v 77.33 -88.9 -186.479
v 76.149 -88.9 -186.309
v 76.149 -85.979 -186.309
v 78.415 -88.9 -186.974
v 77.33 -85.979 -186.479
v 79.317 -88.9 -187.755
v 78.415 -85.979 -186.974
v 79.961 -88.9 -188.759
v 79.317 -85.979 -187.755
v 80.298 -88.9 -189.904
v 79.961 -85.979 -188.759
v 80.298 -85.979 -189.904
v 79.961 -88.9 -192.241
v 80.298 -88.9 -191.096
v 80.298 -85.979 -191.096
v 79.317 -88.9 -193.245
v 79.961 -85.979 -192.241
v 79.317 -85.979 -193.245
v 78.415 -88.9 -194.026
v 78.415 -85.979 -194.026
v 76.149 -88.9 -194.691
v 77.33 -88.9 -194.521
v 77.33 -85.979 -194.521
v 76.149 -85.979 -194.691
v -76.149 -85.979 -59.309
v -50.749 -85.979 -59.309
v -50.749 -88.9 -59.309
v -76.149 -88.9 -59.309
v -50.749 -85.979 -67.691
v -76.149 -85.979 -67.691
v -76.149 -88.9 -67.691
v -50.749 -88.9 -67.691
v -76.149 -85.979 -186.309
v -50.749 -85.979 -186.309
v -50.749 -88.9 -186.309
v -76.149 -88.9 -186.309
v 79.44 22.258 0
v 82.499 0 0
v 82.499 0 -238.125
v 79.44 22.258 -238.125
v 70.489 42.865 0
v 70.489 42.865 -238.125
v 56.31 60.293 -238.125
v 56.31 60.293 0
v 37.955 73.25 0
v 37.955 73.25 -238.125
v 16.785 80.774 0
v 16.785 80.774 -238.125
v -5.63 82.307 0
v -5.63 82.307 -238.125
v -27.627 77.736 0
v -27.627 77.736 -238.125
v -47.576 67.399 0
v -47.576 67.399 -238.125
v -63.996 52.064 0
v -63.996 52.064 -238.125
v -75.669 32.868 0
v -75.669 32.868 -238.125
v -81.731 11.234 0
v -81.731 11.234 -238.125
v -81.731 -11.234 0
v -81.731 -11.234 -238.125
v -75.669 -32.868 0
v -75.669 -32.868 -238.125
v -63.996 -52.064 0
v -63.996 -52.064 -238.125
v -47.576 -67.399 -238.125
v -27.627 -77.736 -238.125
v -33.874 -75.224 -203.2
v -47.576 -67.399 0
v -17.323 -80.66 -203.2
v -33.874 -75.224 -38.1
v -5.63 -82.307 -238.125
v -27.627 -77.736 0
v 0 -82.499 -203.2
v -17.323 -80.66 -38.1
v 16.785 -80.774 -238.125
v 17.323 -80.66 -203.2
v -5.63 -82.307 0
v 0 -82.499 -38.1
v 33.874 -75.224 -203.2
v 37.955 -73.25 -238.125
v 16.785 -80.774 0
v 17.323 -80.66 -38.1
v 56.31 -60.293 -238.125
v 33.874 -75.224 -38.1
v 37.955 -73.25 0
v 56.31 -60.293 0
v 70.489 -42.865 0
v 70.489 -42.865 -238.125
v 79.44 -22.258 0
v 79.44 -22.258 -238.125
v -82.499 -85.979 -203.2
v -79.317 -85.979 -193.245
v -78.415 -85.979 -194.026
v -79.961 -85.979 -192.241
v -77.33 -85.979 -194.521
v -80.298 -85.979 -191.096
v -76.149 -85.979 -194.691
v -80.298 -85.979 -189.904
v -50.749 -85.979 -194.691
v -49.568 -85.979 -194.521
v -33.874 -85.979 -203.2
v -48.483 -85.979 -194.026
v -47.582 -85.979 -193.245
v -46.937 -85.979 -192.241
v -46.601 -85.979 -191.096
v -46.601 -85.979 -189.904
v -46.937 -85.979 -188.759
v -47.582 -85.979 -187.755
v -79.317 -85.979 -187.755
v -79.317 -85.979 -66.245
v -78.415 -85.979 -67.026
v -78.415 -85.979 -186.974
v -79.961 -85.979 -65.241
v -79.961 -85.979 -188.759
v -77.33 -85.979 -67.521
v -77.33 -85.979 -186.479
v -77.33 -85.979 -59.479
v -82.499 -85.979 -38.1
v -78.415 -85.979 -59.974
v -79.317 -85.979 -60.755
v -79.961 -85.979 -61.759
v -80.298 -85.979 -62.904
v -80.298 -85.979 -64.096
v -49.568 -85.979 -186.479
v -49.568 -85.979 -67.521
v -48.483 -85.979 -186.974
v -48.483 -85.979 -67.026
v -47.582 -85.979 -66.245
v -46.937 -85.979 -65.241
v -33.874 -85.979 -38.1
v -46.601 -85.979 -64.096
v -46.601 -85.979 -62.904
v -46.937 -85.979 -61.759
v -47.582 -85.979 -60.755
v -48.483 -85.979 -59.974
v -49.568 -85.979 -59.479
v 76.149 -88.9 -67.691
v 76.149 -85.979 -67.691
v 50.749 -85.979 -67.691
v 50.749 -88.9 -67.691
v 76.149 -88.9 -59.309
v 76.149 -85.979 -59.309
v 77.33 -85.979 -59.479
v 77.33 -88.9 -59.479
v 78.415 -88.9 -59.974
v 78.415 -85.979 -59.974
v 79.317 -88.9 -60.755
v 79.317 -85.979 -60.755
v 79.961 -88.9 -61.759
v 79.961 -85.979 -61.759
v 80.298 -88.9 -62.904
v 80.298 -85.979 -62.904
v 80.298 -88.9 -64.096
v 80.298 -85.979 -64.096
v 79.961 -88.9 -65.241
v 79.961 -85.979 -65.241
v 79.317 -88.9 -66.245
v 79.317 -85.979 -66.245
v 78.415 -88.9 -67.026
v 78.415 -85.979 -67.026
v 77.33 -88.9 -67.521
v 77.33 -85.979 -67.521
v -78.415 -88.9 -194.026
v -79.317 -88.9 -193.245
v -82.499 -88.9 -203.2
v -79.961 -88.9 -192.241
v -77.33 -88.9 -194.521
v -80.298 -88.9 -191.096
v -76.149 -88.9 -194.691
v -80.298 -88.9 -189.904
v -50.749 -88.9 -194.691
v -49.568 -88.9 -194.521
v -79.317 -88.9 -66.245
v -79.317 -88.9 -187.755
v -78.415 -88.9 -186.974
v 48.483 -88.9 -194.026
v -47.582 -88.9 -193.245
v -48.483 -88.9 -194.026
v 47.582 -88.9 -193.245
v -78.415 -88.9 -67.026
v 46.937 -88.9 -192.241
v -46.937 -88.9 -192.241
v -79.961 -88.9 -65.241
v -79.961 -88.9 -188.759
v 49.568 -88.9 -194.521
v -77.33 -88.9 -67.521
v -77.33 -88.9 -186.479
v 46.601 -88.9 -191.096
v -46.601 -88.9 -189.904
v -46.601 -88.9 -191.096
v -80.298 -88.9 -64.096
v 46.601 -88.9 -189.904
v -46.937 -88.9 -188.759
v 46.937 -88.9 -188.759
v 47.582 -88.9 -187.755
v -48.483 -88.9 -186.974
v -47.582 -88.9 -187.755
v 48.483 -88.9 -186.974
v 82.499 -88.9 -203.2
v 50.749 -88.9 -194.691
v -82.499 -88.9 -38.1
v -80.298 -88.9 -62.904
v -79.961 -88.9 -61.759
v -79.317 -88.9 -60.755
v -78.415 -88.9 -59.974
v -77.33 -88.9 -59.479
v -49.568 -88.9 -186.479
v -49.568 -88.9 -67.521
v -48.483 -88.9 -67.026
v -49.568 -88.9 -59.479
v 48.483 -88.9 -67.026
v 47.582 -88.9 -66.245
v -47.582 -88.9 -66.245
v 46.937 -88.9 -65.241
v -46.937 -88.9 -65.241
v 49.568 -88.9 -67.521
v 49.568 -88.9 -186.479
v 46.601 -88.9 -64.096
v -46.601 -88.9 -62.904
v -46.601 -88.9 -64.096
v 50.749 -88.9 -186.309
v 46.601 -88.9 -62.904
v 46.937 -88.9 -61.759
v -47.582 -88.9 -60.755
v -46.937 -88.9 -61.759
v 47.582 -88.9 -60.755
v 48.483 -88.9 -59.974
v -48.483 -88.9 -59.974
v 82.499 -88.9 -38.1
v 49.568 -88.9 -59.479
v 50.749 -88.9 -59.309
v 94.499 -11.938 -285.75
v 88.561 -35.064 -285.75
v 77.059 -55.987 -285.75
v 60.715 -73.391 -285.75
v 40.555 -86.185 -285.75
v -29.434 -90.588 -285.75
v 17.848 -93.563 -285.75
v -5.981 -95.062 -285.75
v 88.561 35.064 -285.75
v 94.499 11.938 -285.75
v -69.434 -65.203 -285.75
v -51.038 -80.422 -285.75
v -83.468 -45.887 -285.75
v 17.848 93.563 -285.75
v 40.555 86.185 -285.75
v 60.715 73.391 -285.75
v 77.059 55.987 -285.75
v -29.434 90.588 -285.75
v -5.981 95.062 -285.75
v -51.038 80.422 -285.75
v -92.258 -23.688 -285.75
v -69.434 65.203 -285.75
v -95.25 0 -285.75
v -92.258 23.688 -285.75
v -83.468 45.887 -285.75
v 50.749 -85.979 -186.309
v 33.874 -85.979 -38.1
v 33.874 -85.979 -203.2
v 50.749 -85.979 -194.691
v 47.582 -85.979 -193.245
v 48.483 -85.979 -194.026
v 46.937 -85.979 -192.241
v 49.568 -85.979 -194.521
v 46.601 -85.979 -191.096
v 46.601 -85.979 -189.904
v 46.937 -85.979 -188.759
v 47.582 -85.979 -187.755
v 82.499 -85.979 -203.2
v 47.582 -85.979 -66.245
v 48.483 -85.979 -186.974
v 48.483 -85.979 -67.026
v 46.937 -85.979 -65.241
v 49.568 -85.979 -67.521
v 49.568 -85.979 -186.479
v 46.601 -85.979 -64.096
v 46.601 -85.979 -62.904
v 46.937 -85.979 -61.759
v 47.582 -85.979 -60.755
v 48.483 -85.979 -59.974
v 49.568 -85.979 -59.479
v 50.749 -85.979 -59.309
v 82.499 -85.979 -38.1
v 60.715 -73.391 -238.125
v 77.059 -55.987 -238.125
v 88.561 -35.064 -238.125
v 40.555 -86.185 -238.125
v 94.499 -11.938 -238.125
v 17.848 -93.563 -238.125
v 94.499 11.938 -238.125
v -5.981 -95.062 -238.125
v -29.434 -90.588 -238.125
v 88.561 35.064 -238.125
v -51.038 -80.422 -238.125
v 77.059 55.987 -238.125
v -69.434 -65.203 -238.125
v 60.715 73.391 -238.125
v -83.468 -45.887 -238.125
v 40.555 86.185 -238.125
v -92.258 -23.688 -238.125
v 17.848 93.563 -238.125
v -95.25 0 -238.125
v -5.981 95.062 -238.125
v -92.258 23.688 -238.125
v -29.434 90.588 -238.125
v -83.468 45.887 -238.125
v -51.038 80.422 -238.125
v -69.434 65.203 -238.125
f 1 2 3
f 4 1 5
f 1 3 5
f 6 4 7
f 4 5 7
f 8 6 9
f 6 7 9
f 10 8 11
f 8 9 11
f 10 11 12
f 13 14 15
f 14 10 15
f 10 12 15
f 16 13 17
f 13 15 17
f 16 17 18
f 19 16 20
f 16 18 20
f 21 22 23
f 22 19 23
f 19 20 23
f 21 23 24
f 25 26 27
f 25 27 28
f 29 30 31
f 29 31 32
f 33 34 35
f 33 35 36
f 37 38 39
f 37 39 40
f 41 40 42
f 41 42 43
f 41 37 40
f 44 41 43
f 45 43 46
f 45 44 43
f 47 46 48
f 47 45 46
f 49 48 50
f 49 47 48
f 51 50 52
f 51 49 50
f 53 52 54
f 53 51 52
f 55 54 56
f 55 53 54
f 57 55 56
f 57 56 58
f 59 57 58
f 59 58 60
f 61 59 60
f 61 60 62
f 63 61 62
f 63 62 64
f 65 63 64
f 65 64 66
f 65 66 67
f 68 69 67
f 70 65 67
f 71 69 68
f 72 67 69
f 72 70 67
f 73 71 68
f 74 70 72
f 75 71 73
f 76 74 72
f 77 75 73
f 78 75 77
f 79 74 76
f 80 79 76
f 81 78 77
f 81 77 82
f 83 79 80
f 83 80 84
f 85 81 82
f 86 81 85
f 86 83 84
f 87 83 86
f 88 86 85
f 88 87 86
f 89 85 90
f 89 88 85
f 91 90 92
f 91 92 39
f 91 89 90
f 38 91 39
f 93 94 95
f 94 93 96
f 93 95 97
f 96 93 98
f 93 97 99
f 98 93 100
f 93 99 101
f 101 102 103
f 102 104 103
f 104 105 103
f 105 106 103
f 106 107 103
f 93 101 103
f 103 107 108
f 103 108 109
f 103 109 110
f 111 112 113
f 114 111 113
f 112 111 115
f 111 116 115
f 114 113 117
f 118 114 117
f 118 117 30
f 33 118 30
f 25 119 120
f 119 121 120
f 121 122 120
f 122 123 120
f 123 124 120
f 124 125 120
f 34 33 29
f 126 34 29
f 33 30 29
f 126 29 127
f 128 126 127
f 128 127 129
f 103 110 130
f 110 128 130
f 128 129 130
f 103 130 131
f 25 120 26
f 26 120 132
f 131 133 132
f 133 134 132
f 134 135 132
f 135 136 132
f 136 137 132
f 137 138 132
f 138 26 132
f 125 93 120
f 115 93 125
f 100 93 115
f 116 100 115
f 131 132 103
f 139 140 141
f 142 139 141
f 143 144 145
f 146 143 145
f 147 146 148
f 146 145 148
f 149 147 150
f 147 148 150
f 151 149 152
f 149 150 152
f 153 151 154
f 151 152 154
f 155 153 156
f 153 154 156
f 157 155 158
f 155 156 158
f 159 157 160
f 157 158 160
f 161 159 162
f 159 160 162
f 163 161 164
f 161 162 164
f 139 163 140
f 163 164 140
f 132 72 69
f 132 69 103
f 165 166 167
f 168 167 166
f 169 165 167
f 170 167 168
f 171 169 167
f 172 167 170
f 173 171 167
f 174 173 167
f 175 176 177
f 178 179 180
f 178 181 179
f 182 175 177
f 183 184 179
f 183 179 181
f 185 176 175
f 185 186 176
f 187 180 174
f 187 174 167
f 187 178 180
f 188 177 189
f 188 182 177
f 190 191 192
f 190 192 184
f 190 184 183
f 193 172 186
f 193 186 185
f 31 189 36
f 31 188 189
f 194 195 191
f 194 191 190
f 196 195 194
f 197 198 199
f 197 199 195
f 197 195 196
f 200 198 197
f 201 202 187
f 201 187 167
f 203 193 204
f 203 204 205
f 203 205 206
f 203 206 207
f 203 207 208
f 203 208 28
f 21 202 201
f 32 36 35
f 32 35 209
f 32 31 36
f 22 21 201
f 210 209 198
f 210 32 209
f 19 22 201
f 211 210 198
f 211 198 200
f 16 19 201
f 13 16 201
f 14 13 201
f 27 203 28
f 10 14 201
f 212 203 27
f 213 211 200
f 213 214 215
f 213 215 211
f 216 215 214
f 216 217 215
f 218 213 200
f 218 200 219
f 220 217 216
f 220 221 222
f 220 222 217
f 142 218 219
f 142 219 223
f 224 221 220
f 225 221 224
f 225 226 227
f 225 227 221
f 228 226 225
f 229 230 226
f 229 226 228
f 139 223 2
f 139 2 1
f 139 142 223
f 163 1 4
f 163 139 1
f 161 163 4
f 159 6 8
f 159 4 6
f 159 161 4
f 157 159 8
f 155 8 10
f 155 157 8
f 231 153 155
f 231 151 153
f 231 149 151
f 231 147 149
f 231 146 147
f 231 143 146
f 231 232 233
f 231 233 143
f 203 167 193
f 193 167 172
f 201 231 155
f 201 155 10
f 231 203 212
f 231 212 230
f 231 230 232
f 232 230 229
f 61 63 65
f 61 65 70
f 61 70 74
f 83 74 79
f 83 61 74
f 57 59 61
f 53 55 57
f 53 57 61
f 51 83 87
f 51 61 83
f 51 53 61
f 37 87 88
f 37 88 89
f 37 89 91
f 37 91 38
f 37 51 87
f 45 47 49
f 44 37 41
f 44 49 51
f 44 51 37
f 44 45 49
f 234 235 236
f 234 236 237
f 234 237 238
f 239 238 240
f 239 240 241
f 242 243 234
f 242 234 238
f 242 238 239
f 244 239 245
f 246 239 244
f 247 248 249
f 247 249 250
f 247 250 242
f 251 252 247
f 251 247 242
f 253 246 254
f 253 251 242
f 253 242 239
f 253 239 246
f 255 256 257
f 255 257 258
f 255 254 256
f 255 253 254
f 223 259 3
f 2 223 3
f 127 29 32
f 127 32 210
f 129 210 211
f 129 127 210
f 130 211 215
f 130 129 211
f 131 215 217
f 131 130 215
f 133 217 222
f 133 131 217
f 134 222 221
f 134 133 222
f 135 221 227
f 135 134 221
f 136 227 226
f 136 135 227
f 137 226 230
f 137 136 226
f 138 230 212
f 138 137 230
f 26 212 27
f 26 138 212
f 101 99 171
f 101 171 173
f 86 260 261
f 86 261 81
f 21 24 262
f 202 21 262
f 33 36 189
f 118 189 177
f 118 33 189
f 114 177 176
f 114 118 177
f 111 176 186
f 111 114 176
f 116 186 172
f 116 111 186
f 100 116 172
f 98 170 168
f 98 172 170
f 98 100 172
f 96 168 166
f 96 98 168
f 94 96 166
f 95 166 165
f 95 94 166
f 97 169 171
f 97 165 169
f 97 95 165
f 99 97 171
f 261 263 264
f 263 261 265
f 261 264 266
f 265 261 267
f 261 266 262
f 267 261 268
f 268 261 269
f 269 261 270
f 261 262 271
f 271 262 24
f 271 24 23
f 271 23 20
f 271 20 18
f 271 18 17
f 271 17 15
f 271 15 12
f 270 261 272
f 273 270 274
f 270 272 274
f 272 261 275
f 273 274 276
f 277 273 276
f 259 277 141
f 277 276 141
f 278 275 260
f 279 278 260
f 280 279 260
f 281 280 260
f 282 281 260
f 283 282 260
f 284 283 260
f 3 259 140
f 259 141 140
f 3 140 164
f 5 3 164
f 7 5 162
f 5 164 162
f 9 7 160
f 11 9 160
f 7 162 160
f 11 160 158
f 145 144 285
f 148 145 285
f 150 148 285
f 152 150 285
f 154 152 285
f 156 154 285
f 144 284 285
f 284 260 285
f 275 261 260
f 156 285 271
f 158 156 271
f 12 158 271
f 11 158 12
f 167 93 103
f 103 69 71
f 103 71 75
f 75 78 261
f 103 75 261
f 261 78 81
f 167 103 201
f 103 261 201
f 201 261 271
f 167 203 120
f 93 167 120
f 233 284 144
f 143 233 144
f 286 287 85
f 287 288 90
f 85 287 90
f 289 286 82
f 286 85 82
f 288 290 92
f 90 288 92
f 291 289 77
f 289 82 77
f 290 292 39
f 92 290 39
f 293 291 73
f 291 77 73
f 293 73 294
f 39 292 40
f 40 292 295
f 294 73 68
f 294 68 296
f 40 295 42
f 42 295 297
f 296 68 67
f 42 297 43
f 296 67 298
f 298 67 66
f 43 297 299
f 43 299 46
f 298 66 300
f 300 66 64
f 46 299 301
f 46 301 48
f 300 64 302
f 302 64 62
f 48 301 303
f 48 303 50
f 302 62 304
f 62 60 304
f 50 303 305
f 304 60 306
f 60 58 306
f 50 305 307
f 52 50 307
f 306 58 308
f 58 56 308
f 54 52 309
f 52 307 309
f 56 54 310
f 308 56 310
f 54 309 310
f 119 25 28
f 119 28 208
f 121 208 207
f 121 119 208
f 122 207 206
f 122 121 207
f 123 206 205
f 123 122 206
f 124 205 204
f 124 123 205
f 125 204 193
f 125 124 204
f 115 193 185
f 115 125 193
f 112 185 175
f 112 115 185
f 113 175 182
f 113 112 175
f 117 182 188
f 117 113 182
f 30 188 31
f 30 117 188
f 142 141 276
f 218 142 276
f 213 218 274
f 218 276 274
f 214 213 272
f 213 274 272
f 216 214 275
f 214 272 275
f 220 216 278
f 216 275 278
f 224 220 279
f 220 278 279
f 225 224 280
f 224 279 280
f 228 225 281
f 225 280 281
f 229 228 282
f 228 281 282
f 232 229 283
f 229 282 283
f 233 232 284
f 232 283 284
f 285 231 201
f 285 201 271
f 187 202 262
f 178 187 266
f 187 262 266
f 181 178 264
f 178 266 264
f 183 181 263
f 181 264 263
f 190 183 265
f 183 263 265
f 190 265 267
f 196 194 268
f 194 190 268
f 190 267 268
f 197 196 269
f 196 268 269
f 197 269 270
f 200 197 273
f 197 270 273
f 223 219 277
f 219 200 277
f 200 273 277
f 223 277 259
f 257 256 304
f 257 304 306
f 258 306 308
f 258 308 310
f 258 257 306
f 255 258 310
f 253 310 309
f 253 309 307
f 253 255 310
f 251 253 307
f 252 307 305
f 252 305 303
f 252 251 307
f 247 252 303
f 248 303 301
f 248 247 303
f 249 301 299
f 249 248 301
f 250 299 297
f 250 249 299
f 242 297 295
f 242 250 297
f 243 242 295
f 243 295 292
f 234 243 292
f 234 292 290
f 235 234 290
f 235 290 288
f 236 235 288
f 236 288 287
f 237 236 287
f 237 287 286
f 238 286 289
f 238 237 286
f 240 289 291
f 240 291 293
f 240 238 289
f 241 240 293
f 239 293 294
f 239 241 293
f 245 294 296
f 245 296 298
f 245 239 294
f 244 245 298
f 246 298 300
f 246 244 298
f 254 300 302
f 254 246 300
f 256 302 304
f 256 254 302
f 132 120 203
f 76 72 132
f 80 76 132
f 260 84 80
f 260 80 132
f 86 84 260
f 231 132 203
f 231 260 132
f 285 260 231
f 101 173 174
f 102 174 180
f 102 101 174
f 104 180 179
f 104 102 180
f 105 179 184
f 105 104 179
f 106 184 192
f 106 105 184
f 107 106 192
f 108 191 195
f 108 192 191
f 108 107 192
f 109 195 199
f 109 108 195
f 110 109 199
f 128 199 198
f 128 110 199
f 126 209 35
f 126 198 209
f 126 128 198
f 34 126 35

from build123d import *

# Parameters (mm, degrees)
SKETCH1_R           = 82.4992
BOSS_EXTRUDE1_DEPTH = 285.75
SKETCH2_R           = 95.25
BOSS_EXTRUDE2_DEPTH = 47.625
SKETCH3_W           = 164.9984
SKETCH3_H           = 2.921
BOSS_EXTRUDE3_DEPTH = 165.1
CUT_EXTRUDE1_REACH  = 353.525


with BuildPart() as part:
    # Sketch1 → Boss-Extrude1 (new body)
    with BuildSketch(Plane.XY):
        Circle(SKETCH1_R)
    extrude(amount=-BOSS_EXTRUDE1_DEPTH)

    # Sketch2 → Boss-Extrude2 (add)
    with BuildSketch(Plane(origin=(0, 0, -285.75), x_dir=(-1, 0, 0), z_dir=(0, 0, -1))):
        Circle(SKETCH2_R)
    extrude(amount=-BOSS_EXTRUDE2_DEPTH)

    # Sketch3 → Boss-Extrude3 (add)
    with BuildSketch(Plane.XY.offset(-38.1)):
        with BuildLine():
            Line((-33.873610408, -85.979), (33.873610408, -85.979))
            Line((33.873610408, -85.979), (33.873610408, -75.22430803))
            ThreePointArc((33.873610408, -75.22430803), (0, -82.4992), (-33.873610408, -75.22430803))
            Line((-33.873610408, -75.22430803), (-33.873610408, -85.979))
        make_face()
        with Locations((0, -87.4395)):
            Rectangle(SKETCH3_W, SKETCH3_H)
    extrude(amount=-BOSS_EXTRUDE3_DEPTH)

    # Sketch4 → Cut-Extrude1 (cut, up to next)
    with BuildSketch(Plane(origin=(0, -85.979, 0), x_dir=(1, 0, 0), z_dir=(0, 1, 0)), mode=Mode.PRIVATE) as cut_extrude1_sk1:
        with BuildLine():
            Line((-76.1492, 67.691), (-50.7492, 67.691))
            ThreePointArc((-50.7492, 67.691), (-46.5582, 63.5), (-50.7492, 59.309))
            Line((-50.7492, 59.309), (-76.1492, 59.309))
            ThreePointArc((-76.1492, 59.309), (-80.3402, 63.5), (-76.1492, 67.691))
        make_face()
    cut_extrude1_tool1 = extrude(cut_extrude1_sk1.sketch, amount=-CUT_EXTRUDE1_REACH, mode=Mode.PRIVATE) & part.part
    # Sketch4 → Cut-Extrude1 (cut, up to next)
    with BuildSketch(Plane(origin=(0, -85.979, 0), x_dir=(1, 0, 0), z_dir=(0, 1, 0)), mode=Mode.PRIVATE) as cut_extrude1_sk2:
        with BuildLine():
            Line((-50.7492, 186.309), (-76.1492, 186.309))
            ThreePointArc((-76.1492, 186.309), (-80.3402, 190.5), (-76.1492, 194.691))
            Line((-76.1492, 194.691), (-50.7492, 194.691))
            ThreePointArc((-50.7492, 194.691), (-46.5582, 190.5), (-50.7492, 186.309))
        make_face()
    cut_extrude1_tool2 = extrude(cut_extrude1_sk2.sketch, amount=-CUT_EXTRUDE1_REACH, mode=Mode.PRIVATE) & part.part
    cut_extrude1_1 = cut_extrude1_tool1.solids().sort_by_distance((-63.4492, -85.979, -63.5))[0]
    add(cut_extrude1_1, mode=Mode.SUBTRACT)
    cut_extrude1_2 = cut_extrude1_tool2.solids().sort_by_distance((-63.4492, -85.979, -190.5))[0]
    add(cut_extrude1_2, mode=Mode.SUBTRACT)
    cut_extrude1 = cut_extrude1_1 + cut_extrude1_2  # Cut-Extrude1 as one shape, for the pattern or mirror that repeats it

    # Mirror1: Cut-Extrude1 across plane
    add(cut_extrude1.mirror(Plane(origin=(0, 0, 0), x_dir=(0, 0, 1), z_dir=(1, 0, 0))), mode=Mode.SUBTRACT)


solid = part.part
